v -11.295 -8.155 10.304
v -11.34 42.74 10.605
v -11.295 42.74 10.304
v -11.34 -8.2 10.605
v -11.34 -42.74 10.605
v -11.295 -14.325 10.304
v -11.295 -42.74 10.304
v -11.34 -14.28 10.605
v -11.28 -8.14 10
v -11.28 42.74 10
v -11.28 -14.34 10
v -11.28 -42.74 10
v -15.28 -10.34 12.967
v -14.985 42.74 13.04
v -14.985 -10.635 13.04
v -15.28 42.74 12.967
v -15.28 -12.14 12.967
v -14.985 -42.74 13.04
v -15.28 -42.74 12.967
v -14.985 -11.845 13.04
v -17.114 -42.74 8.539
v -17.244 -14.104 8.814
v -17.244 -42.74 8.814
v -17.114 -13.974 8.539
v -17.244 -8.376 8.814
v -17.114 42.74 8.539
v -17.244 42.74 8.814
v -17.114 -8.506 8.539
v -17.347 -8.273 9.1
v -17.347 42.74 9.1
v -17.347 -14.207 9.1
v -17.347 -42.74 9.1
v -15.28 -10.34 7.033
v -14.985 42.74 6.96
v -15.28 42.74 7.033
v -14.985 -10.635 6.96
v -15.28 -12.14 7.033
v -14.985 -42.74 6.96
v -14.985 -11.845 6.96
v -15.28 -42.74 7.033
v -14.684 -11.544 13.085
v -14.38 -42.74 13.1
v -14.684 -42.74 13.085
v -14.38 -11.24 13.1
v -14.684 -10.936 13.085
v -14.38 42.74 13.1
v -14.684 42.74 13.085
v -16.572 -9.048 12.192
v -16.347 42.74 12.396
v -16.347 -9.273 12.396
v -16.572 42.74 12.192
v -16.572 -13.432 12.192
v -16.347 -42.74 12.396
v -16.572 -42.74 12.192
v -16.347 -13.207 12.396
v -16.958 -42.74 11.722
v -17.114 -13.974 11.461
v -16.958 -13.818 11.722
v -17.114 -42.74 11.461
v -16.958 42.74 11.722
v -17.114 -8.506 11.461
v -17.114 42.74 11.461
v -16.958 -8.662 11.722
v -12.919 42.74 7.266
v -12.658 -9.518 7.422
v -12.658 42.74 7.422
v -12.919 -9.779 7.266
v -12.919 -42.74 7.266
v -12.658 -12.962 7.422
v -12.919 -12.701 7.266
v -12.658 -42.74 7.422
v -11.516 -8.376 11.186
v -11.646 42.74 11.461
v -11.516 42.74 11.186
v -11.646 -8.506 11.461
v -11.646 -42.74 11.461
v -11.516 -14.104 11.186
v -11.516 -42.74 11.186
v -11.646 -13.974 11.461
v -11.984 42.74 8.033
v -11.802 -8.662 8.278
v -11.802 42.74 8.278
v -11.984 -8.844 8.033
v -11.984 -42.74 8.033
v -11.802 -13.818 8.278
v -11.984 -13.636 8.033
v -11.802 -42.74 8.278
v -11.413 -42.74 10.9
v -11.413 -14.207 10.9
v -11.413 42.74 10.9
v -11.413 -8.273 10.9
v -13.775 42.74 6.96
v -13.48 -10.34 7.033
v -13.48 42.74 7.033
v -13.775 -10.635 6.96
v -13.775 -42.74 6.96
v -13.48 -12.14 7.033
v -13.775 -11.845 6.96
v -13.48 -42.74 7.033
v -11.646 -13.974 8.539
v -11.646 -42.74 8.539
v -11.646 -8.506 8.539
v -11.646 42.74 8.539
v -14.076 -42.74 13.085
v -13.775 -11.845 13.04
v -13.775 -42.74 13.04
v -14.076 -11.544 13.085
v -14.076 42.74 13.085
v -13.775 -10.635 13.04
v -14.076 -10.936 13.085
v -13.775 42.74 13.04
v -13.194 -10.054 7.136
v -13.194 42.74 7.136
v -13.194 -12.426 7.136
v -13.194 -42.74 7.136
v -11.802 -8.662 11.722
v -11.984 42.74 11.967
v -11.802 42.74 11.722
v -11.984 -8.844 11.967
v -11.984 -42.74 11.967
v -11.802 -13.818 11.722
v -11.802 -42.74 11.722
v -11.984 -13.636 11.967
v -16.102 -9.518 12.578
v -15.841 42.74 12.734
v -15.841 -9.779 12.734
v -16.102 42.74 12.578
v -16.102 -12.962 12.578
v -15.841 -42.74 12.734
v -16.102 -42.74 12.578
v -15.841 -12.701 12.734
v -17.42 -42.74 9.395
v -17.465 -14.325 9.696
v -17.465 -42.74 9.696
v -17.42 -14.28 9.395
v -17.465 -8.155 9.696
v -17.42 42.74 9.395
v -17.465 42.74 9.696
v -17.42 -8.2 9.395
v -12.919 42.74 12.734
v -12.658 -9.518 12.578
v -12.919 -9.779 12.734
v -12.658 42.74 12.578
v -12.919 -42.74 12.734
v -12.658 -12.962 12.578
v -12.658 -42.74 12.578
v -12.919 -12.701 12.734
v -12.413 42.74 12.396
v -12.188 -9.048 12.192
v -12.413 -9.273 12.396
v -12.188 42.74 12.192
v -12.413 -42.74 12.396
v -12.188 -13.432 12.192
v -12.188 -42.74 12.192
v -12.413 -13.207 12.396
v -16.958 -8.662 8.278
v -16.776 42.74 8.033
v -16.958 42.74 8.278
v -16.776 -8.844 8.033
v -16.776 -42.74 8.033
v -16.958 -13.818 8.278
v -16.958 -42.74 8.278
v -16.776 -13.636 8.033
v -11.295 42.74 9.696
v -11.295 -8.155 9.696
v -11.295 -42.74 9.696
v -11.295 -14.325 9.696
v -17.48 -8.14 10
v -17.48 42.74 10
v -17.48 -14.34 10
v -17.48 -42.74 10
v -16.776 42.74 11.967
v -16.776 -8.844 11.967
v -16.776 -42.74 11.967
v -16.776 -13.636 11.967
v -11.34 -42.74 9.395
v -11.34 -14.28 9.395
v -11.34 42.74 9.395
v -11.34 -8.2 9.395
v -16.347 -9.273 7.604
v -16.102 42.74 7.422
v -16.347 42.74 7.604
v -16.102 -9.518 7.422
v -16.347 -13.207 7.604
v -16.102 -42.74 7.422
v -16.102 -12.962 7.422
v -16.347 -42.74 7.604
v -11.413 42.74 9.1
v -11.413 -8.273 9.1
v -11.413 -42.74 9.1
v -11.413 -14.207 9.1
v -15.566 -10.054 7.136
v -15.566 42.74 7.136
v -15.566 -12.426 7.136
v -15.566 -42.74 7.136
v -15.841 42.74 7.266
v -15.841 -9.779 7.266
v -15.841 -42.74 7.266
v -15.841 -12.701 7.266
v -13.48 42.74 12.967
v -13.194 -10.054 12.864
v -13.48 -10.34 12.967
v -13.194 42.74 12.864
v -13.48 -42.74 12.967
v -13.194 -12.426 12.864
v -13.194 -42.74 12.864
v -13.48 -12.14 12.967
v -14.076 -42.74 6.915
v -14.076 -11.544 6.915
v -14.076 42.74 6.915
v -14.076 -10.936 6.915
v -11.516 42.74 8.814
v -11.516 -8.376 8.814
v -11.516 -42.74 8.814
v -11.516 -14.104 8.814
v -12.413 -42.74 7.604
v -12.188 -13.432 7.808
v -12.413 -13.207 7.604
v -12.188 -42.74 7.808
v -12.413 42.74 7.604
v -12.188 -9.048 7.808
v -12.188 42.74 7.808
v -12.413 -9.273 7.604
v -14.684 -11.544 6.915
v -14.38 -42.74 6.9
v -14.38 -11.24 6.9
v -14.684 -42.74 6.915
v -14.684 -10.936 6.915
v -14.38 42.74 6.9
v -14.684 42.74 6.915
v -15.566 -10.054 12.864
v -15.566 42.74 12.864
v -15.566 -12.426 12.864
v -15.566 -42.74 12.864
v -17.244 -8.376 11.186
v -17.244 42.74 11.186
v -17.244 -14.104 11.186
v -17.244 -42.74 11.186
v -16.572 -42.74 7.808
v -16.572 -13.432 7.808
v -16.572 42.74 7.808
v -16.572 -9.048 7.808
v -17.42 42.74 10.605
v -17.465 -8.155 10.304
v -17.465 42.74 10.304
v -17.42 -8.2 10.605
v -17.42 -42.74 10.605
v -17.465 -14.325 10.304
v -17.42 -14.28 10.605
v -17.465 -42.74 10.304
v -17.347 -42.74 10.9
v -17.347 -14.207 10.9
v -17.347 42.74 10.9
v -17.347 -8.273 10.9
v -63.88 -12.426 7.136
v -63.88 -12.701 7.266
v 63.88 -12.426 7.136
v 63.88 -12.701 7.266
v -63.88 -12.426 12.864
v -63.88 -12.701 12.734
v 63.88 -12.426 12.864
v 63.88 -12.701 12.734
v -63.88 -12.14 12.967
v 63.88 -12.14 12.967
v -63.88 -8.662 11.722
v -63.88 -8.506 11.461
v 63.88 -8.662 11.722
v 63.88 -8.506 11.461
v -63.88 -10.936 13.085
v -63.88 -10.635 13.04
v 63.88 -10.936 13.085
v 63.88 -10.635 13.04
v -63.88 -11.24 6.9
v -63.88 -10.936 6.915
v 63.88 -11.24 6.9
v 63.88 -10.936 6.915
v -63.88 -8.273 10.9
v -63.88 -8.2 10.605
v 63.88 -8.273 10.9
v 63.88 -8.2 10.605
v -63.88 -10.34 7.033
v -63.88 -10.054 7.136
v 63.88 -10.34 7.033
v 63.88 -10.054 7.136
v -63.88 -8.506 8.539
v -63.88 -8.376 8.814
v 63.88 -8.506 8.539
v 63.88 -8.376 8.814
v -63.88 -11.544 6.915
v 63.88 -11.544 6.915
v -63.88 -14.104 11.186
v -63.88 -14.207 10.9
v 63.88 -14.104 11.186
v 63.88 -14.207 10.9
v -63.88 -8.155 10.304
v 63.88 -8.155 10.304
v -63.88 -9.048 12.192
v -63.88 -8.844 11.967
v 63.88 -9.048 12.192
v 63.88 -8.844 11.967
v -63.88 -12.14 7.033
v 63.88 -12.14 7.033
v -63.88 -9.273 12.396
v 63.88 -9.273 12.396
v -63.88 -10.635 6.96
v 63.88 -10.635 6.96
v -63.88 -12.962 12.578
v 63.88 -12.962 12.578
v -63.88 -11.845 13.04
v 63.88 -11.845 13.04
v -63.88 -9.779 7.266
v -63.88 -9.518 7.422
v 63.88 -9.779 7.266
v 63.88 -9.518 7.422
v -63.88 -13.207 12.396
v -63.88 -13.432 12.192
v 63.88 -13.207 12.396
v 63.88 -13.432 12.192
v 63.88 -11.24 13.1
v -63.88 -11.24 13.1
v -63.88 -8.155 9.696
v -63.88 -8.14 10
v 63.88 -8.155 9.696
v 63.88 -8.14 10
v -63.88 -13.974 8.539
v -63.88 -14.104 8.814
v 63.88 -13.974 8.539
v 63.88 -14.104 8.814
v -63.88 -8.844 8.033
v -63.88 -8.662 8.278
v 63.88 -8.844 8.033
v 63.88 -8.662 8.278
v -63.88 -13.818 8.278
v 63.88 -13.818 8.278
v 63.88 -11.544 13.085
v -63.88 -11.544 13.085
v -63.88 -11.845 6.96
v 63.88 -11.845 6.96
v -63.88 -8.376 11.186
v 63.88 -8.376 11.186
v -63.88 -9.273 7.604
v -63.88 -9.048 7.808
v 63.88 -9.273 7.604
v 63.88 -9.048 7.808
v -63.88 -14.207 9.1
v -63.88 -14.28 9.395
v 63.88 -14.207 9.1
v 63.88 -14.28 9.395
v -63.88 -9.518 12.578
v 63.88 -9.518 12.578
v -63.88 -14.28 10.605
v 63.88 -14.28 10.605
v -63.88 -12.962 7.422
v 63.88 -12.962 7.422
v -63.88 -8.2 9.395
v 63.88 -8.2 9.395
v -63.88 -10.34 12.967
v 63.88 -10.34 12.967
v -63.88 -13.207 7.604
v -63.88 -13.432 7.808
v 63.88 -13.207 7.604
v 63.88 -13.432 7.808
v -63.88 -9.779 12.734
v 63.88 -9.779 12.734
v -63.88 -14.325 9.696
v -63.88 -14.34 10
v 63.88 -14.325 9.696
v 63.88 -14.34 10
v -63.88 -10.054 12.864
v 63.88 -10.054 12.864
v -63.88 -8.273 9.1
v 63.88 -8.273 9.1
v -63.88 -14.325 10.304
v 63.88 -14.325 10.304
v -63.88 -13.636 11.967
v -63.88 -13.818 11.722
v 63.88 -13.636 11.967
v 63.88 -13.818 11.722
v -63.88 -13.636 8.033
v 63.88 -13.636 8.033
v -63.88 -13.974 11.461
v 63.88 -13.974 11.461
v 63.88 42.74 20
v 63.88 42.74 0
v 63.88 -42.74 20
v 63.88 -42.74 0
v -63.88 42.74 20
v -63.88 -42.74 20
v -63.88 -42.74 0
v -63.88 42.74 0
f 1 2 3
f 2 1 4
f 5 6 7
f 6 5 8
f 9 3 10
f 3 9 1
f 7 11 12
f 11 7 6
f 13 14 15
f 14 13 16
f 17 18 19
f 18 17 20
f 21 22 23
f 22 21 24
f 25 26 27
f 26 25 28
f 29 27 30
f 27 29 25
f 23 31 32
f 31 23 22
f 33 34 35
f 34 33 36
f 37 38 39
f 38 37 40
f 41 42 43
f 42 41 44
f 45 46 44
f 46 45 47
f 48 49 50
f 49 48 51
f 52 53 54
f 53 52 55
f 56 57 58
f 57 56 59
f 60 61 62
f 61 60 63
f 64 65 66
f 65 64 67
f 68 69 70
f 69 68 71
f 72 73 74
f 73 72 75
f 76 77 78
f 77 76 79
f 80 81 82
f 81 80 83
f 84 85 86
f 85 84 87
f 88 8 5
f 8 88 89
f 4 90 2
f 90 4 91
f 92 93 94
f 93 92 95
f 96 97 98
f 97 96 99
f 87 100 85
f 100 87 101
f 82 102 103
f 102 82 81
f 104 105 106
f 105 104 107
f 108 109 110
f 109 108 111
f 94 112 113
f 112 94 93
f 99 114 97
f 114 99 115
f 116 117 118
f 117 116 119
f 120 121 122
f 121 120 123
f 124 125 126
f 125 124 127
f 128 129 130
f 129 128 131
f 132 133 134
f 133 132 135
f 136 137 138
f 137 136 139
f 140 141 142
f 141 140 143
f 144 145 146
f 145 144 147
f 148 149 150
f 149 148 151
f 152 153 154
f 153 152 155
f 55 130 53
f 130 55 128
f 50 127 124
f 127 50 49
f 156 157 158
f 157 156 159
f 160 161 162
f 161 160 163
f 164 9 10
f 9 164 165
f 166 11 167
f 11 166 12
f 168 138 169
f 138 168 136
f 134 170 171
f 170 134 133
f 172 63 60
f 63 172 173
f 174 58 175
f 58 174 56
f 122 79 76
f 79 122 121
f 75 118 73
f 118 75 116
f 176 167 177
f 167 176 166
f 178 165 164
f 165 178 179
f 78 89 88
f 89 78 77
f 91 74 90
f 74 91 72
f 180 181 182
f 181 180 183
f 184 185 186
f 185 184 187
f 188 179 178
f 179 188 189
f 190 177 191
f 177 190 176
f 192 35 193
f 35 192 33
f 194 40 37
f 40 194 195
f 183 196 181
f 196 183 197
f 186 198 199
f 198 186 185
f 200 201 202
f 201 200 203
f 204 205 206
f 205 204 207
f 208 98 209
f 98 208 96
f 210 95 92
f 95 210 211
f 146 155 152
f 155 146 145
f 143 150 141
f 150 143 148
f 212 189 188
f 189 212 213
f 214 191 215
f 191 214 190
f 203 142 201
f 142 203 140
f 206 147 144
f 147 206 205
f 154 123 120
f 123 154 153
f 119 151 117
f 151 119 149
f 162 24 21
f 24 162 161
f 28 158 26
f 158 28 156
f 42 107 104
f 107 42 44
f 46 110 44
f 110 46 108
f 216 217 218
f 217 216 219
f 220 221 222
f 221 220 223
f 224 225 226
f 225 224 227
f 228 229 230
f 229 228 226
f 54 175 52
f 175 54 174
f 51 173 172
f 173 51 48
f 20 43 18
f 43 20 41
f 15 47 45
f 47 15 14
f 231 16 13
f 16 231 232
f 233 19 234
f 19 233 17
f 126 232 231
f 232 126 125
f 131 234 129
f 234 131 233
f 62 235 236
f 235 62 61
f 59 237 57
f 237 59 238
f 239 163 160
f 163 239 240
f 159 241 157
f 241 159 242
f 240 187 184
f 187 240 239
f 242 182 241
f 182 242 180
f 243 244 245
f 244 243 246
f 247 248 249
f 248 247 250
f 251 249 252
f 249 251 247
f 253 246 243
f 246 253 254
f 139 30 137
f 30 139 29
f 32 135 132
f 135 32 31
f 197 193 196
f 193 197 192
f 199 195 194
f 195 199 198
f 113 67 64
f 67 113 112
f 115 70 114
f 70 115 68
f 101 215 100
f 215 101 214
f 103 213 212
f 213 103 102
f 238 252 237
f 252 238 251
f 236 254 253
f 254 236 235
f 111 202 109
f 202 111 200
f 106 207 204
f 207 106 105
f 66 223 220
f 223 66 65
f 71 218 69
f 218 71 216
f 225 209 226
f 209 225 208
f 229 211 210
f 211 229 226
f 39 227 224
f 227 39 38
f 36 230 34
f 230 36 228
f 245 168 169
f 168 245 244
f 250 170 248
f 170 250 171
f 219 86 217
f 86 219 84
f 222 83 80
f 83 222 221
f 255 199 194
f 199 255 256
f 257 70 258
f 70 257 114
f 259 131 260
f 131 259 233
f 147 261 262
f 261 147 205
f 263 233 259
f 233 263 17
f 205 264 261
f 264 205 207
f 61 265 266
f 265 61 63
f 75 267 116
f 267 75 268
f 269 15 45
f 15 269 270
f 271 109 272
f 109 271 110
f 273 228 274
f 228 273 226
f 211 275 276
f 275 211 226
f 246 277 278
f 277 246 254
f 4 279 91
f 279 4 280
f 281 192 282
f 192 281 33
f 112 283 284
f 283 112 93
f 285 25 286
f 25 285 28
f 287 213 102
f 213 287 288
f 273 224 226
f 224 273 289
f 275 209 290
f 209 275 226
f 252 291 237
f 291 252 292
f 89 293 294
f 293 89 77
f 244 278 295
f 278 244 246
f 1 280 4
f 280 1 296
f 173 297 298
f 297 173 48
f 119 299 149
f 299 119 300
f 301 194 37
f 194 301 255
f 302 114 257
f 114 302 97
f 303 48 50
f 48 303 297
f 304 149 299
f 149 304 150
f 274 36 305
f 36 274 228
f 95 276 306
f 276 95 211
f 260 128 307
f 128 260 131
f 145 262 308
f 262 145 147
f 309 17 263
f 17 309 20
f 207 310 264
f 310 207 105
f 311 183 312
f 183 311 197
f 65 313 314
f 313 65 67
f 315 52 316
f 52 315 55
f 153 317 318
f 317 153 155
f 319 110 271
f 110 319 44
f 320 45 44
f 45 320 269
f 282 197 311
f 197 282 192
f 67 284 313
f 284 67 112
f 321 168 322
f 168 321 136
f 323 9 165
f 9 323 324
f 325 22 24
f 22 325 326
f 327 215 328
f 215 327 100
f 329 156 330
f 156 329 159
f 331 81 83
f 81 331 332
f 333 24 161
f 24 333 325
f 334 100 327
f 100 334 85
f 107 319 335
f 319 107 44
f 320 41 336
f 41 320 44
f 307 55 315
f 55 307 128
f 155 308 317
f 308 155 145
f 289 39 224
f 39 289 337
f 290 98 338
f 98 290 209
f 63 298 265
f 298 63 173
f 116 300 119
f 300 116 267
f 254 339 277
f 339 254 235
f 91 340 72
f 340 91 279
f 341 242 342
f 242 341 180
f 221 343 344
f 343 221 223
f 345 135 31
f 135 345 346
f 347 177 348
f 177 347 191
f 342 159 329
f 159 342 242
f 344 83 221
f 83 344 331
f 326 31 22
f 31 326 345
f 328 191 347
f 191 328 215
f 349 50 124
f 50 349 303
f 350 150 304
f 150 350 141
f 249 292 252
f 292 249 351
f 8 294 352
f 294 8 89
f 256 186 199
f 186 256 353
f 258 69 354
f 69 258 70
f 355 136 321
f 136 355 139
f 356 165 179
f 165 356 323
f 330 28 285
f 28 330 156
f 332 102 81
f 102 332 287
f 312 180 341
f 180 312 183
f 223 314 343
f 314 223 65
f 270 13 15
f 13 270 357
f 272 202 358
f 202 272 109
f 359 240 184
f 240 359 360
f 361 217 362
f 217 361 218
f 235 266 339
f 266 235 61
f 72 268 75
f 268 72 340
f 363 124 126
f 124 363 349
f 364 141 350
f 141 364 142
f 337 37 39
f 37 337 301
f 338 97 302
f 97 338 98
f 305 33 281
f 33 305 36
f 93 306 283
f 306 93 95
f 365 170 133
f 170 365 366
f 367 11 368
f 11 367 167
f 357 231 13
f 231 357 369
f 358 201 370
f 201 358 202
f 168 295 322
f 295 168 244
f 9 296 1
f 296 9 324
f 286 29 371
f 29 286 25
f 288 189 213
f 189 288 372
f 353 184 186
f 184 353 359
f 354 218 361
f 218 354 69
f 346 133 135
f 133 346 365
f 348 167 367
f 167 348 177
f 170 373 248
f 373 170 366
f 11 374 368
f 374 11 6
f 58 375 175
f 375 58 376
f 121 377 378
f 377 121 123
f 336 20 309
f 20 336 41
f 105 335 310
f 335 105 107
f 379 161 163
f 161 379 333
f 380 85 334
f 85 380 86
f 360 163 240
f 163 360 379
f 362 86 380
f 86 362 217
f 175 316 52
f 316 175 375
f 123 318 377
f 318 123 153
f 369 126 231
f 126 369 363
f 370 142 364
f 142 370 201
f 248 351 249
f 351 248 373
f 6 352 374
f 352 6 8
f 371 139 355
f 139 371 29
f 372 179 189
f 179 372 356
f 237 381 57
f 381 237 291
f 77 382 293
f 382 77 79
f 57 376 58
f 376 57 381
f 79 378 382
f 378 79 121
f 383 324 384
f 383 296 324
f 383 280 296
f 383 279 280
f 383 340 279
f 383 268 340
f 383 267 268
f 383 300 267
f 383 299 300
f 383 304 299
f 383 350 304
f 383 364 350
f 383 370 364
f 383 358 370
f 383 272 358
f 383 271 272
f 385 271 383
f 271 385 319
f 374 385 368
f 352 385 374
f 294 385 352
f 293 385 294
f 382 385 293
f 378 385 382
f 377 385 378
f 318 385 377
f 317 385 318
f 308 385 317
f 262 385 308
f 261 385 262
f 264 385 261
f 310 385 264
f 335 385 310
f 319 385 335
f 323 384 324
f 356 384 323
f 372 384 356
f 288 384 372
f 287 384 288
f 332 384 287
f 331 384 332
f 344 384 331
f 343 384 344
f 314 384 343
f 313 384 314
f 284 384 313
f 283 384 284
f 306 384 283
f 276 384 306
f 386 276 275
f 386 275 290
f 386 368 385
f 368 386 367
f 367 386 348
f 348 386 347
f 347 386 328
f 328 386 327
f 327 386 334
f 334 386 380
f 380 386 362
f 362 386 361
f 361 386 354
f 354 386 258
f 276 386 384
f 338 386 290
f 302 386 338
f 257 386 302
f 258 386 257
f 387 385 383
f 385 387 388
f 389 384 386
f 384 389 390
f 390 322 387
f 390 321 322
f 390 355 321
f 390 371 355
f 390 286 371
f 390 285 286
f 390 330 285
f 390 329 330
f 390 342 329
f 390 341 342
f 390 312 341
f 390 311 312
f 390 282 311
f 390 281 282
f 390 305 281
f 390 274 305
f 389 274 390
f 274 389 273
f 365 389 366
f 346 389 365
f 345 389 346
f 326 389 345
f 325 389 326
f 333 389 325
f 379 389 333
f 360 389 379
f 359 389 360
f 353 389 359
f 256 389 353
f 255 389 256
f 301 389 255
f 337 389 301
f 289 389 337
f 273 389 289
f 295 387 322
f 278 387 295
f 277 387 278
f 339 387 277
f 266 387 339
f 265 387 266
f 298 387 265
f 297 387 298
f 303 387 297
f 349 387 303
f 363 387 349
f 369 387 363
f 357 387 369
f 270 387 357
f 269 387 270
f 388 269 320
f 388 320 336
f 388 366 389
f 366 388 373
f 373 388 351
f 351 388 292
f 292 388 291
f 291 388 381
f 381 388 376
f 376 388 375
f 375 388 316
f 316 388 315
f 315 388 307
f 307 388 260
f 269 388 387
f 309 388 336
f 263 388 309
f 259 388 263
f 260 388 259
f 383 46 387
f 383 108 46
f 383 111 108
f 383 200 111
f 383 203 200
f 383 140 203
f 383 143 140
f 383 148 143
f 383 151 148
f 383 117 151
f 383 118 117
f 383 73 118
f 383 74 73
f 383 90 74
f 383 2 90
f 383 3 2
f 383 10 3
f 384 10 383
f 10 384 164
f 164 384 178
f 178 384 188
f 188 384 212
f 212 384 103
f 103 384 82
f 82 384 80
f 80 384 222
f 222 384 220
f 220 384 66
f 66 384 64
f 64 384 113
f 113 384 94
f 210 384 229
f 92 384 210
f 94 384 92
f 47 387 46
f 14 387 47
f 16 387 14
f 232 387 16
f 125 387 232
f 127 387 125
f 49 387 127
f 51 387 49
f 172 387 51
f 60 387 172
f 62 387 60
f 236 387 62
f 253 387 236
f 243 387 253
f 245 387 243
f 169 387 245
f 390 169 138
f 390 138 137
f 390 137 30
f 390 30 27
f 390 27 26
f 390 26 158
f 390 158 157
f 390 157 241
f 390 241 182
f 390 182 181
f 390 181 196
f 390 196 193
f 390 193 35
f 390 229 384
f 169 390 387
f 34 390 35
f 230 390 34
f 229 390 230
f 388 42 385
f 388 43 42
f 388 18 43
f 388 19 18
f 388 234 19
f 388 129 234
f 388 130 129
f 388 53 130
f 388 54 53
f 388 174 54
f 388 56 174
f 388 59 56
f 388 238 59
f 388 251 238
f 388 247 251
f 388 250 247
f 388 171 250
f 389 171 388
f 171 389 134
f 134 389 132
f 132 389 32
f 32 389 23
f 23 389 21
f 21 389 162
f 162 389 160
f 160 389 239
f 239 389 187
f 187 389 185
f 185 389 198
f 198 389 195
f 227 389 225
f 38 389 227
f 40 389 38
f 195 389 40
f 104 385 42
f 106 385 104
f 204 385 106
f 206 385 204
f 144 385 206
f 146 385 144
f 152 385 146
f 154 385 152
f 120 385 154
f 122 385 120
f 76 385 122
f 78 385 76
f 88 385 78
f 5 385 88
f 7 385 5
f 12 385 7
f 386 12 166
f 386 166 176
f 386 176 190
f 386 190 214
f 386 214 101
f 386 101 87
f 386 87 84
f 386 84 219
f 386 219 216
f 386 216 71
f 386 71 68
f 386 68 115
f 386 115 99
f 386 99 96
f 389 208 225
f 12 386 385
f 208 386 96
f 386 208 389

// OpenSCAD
// Built by bench/smallmodels/features/compiler.py from a list of features.
$fn = 64;
difference() {
  union() {
    translate([0, 0, 0]) translate([-63.88, -42.74, 0]) cube([127.76, 85.48, 20]);
  }
  union() {
    translate([-14.38, -11.24, 10]) rotate([0, 0, 0]) rotate([90, 0, 0]) cylinder(d = 6.2, h = 1080, center = true);
    translate([-14.38, -11.24, 10]) rotate([0, 0, 0]) rotate([0, 90, 0]) cylinder(d = 6.2, h = 1080, center = true);
  }
}
